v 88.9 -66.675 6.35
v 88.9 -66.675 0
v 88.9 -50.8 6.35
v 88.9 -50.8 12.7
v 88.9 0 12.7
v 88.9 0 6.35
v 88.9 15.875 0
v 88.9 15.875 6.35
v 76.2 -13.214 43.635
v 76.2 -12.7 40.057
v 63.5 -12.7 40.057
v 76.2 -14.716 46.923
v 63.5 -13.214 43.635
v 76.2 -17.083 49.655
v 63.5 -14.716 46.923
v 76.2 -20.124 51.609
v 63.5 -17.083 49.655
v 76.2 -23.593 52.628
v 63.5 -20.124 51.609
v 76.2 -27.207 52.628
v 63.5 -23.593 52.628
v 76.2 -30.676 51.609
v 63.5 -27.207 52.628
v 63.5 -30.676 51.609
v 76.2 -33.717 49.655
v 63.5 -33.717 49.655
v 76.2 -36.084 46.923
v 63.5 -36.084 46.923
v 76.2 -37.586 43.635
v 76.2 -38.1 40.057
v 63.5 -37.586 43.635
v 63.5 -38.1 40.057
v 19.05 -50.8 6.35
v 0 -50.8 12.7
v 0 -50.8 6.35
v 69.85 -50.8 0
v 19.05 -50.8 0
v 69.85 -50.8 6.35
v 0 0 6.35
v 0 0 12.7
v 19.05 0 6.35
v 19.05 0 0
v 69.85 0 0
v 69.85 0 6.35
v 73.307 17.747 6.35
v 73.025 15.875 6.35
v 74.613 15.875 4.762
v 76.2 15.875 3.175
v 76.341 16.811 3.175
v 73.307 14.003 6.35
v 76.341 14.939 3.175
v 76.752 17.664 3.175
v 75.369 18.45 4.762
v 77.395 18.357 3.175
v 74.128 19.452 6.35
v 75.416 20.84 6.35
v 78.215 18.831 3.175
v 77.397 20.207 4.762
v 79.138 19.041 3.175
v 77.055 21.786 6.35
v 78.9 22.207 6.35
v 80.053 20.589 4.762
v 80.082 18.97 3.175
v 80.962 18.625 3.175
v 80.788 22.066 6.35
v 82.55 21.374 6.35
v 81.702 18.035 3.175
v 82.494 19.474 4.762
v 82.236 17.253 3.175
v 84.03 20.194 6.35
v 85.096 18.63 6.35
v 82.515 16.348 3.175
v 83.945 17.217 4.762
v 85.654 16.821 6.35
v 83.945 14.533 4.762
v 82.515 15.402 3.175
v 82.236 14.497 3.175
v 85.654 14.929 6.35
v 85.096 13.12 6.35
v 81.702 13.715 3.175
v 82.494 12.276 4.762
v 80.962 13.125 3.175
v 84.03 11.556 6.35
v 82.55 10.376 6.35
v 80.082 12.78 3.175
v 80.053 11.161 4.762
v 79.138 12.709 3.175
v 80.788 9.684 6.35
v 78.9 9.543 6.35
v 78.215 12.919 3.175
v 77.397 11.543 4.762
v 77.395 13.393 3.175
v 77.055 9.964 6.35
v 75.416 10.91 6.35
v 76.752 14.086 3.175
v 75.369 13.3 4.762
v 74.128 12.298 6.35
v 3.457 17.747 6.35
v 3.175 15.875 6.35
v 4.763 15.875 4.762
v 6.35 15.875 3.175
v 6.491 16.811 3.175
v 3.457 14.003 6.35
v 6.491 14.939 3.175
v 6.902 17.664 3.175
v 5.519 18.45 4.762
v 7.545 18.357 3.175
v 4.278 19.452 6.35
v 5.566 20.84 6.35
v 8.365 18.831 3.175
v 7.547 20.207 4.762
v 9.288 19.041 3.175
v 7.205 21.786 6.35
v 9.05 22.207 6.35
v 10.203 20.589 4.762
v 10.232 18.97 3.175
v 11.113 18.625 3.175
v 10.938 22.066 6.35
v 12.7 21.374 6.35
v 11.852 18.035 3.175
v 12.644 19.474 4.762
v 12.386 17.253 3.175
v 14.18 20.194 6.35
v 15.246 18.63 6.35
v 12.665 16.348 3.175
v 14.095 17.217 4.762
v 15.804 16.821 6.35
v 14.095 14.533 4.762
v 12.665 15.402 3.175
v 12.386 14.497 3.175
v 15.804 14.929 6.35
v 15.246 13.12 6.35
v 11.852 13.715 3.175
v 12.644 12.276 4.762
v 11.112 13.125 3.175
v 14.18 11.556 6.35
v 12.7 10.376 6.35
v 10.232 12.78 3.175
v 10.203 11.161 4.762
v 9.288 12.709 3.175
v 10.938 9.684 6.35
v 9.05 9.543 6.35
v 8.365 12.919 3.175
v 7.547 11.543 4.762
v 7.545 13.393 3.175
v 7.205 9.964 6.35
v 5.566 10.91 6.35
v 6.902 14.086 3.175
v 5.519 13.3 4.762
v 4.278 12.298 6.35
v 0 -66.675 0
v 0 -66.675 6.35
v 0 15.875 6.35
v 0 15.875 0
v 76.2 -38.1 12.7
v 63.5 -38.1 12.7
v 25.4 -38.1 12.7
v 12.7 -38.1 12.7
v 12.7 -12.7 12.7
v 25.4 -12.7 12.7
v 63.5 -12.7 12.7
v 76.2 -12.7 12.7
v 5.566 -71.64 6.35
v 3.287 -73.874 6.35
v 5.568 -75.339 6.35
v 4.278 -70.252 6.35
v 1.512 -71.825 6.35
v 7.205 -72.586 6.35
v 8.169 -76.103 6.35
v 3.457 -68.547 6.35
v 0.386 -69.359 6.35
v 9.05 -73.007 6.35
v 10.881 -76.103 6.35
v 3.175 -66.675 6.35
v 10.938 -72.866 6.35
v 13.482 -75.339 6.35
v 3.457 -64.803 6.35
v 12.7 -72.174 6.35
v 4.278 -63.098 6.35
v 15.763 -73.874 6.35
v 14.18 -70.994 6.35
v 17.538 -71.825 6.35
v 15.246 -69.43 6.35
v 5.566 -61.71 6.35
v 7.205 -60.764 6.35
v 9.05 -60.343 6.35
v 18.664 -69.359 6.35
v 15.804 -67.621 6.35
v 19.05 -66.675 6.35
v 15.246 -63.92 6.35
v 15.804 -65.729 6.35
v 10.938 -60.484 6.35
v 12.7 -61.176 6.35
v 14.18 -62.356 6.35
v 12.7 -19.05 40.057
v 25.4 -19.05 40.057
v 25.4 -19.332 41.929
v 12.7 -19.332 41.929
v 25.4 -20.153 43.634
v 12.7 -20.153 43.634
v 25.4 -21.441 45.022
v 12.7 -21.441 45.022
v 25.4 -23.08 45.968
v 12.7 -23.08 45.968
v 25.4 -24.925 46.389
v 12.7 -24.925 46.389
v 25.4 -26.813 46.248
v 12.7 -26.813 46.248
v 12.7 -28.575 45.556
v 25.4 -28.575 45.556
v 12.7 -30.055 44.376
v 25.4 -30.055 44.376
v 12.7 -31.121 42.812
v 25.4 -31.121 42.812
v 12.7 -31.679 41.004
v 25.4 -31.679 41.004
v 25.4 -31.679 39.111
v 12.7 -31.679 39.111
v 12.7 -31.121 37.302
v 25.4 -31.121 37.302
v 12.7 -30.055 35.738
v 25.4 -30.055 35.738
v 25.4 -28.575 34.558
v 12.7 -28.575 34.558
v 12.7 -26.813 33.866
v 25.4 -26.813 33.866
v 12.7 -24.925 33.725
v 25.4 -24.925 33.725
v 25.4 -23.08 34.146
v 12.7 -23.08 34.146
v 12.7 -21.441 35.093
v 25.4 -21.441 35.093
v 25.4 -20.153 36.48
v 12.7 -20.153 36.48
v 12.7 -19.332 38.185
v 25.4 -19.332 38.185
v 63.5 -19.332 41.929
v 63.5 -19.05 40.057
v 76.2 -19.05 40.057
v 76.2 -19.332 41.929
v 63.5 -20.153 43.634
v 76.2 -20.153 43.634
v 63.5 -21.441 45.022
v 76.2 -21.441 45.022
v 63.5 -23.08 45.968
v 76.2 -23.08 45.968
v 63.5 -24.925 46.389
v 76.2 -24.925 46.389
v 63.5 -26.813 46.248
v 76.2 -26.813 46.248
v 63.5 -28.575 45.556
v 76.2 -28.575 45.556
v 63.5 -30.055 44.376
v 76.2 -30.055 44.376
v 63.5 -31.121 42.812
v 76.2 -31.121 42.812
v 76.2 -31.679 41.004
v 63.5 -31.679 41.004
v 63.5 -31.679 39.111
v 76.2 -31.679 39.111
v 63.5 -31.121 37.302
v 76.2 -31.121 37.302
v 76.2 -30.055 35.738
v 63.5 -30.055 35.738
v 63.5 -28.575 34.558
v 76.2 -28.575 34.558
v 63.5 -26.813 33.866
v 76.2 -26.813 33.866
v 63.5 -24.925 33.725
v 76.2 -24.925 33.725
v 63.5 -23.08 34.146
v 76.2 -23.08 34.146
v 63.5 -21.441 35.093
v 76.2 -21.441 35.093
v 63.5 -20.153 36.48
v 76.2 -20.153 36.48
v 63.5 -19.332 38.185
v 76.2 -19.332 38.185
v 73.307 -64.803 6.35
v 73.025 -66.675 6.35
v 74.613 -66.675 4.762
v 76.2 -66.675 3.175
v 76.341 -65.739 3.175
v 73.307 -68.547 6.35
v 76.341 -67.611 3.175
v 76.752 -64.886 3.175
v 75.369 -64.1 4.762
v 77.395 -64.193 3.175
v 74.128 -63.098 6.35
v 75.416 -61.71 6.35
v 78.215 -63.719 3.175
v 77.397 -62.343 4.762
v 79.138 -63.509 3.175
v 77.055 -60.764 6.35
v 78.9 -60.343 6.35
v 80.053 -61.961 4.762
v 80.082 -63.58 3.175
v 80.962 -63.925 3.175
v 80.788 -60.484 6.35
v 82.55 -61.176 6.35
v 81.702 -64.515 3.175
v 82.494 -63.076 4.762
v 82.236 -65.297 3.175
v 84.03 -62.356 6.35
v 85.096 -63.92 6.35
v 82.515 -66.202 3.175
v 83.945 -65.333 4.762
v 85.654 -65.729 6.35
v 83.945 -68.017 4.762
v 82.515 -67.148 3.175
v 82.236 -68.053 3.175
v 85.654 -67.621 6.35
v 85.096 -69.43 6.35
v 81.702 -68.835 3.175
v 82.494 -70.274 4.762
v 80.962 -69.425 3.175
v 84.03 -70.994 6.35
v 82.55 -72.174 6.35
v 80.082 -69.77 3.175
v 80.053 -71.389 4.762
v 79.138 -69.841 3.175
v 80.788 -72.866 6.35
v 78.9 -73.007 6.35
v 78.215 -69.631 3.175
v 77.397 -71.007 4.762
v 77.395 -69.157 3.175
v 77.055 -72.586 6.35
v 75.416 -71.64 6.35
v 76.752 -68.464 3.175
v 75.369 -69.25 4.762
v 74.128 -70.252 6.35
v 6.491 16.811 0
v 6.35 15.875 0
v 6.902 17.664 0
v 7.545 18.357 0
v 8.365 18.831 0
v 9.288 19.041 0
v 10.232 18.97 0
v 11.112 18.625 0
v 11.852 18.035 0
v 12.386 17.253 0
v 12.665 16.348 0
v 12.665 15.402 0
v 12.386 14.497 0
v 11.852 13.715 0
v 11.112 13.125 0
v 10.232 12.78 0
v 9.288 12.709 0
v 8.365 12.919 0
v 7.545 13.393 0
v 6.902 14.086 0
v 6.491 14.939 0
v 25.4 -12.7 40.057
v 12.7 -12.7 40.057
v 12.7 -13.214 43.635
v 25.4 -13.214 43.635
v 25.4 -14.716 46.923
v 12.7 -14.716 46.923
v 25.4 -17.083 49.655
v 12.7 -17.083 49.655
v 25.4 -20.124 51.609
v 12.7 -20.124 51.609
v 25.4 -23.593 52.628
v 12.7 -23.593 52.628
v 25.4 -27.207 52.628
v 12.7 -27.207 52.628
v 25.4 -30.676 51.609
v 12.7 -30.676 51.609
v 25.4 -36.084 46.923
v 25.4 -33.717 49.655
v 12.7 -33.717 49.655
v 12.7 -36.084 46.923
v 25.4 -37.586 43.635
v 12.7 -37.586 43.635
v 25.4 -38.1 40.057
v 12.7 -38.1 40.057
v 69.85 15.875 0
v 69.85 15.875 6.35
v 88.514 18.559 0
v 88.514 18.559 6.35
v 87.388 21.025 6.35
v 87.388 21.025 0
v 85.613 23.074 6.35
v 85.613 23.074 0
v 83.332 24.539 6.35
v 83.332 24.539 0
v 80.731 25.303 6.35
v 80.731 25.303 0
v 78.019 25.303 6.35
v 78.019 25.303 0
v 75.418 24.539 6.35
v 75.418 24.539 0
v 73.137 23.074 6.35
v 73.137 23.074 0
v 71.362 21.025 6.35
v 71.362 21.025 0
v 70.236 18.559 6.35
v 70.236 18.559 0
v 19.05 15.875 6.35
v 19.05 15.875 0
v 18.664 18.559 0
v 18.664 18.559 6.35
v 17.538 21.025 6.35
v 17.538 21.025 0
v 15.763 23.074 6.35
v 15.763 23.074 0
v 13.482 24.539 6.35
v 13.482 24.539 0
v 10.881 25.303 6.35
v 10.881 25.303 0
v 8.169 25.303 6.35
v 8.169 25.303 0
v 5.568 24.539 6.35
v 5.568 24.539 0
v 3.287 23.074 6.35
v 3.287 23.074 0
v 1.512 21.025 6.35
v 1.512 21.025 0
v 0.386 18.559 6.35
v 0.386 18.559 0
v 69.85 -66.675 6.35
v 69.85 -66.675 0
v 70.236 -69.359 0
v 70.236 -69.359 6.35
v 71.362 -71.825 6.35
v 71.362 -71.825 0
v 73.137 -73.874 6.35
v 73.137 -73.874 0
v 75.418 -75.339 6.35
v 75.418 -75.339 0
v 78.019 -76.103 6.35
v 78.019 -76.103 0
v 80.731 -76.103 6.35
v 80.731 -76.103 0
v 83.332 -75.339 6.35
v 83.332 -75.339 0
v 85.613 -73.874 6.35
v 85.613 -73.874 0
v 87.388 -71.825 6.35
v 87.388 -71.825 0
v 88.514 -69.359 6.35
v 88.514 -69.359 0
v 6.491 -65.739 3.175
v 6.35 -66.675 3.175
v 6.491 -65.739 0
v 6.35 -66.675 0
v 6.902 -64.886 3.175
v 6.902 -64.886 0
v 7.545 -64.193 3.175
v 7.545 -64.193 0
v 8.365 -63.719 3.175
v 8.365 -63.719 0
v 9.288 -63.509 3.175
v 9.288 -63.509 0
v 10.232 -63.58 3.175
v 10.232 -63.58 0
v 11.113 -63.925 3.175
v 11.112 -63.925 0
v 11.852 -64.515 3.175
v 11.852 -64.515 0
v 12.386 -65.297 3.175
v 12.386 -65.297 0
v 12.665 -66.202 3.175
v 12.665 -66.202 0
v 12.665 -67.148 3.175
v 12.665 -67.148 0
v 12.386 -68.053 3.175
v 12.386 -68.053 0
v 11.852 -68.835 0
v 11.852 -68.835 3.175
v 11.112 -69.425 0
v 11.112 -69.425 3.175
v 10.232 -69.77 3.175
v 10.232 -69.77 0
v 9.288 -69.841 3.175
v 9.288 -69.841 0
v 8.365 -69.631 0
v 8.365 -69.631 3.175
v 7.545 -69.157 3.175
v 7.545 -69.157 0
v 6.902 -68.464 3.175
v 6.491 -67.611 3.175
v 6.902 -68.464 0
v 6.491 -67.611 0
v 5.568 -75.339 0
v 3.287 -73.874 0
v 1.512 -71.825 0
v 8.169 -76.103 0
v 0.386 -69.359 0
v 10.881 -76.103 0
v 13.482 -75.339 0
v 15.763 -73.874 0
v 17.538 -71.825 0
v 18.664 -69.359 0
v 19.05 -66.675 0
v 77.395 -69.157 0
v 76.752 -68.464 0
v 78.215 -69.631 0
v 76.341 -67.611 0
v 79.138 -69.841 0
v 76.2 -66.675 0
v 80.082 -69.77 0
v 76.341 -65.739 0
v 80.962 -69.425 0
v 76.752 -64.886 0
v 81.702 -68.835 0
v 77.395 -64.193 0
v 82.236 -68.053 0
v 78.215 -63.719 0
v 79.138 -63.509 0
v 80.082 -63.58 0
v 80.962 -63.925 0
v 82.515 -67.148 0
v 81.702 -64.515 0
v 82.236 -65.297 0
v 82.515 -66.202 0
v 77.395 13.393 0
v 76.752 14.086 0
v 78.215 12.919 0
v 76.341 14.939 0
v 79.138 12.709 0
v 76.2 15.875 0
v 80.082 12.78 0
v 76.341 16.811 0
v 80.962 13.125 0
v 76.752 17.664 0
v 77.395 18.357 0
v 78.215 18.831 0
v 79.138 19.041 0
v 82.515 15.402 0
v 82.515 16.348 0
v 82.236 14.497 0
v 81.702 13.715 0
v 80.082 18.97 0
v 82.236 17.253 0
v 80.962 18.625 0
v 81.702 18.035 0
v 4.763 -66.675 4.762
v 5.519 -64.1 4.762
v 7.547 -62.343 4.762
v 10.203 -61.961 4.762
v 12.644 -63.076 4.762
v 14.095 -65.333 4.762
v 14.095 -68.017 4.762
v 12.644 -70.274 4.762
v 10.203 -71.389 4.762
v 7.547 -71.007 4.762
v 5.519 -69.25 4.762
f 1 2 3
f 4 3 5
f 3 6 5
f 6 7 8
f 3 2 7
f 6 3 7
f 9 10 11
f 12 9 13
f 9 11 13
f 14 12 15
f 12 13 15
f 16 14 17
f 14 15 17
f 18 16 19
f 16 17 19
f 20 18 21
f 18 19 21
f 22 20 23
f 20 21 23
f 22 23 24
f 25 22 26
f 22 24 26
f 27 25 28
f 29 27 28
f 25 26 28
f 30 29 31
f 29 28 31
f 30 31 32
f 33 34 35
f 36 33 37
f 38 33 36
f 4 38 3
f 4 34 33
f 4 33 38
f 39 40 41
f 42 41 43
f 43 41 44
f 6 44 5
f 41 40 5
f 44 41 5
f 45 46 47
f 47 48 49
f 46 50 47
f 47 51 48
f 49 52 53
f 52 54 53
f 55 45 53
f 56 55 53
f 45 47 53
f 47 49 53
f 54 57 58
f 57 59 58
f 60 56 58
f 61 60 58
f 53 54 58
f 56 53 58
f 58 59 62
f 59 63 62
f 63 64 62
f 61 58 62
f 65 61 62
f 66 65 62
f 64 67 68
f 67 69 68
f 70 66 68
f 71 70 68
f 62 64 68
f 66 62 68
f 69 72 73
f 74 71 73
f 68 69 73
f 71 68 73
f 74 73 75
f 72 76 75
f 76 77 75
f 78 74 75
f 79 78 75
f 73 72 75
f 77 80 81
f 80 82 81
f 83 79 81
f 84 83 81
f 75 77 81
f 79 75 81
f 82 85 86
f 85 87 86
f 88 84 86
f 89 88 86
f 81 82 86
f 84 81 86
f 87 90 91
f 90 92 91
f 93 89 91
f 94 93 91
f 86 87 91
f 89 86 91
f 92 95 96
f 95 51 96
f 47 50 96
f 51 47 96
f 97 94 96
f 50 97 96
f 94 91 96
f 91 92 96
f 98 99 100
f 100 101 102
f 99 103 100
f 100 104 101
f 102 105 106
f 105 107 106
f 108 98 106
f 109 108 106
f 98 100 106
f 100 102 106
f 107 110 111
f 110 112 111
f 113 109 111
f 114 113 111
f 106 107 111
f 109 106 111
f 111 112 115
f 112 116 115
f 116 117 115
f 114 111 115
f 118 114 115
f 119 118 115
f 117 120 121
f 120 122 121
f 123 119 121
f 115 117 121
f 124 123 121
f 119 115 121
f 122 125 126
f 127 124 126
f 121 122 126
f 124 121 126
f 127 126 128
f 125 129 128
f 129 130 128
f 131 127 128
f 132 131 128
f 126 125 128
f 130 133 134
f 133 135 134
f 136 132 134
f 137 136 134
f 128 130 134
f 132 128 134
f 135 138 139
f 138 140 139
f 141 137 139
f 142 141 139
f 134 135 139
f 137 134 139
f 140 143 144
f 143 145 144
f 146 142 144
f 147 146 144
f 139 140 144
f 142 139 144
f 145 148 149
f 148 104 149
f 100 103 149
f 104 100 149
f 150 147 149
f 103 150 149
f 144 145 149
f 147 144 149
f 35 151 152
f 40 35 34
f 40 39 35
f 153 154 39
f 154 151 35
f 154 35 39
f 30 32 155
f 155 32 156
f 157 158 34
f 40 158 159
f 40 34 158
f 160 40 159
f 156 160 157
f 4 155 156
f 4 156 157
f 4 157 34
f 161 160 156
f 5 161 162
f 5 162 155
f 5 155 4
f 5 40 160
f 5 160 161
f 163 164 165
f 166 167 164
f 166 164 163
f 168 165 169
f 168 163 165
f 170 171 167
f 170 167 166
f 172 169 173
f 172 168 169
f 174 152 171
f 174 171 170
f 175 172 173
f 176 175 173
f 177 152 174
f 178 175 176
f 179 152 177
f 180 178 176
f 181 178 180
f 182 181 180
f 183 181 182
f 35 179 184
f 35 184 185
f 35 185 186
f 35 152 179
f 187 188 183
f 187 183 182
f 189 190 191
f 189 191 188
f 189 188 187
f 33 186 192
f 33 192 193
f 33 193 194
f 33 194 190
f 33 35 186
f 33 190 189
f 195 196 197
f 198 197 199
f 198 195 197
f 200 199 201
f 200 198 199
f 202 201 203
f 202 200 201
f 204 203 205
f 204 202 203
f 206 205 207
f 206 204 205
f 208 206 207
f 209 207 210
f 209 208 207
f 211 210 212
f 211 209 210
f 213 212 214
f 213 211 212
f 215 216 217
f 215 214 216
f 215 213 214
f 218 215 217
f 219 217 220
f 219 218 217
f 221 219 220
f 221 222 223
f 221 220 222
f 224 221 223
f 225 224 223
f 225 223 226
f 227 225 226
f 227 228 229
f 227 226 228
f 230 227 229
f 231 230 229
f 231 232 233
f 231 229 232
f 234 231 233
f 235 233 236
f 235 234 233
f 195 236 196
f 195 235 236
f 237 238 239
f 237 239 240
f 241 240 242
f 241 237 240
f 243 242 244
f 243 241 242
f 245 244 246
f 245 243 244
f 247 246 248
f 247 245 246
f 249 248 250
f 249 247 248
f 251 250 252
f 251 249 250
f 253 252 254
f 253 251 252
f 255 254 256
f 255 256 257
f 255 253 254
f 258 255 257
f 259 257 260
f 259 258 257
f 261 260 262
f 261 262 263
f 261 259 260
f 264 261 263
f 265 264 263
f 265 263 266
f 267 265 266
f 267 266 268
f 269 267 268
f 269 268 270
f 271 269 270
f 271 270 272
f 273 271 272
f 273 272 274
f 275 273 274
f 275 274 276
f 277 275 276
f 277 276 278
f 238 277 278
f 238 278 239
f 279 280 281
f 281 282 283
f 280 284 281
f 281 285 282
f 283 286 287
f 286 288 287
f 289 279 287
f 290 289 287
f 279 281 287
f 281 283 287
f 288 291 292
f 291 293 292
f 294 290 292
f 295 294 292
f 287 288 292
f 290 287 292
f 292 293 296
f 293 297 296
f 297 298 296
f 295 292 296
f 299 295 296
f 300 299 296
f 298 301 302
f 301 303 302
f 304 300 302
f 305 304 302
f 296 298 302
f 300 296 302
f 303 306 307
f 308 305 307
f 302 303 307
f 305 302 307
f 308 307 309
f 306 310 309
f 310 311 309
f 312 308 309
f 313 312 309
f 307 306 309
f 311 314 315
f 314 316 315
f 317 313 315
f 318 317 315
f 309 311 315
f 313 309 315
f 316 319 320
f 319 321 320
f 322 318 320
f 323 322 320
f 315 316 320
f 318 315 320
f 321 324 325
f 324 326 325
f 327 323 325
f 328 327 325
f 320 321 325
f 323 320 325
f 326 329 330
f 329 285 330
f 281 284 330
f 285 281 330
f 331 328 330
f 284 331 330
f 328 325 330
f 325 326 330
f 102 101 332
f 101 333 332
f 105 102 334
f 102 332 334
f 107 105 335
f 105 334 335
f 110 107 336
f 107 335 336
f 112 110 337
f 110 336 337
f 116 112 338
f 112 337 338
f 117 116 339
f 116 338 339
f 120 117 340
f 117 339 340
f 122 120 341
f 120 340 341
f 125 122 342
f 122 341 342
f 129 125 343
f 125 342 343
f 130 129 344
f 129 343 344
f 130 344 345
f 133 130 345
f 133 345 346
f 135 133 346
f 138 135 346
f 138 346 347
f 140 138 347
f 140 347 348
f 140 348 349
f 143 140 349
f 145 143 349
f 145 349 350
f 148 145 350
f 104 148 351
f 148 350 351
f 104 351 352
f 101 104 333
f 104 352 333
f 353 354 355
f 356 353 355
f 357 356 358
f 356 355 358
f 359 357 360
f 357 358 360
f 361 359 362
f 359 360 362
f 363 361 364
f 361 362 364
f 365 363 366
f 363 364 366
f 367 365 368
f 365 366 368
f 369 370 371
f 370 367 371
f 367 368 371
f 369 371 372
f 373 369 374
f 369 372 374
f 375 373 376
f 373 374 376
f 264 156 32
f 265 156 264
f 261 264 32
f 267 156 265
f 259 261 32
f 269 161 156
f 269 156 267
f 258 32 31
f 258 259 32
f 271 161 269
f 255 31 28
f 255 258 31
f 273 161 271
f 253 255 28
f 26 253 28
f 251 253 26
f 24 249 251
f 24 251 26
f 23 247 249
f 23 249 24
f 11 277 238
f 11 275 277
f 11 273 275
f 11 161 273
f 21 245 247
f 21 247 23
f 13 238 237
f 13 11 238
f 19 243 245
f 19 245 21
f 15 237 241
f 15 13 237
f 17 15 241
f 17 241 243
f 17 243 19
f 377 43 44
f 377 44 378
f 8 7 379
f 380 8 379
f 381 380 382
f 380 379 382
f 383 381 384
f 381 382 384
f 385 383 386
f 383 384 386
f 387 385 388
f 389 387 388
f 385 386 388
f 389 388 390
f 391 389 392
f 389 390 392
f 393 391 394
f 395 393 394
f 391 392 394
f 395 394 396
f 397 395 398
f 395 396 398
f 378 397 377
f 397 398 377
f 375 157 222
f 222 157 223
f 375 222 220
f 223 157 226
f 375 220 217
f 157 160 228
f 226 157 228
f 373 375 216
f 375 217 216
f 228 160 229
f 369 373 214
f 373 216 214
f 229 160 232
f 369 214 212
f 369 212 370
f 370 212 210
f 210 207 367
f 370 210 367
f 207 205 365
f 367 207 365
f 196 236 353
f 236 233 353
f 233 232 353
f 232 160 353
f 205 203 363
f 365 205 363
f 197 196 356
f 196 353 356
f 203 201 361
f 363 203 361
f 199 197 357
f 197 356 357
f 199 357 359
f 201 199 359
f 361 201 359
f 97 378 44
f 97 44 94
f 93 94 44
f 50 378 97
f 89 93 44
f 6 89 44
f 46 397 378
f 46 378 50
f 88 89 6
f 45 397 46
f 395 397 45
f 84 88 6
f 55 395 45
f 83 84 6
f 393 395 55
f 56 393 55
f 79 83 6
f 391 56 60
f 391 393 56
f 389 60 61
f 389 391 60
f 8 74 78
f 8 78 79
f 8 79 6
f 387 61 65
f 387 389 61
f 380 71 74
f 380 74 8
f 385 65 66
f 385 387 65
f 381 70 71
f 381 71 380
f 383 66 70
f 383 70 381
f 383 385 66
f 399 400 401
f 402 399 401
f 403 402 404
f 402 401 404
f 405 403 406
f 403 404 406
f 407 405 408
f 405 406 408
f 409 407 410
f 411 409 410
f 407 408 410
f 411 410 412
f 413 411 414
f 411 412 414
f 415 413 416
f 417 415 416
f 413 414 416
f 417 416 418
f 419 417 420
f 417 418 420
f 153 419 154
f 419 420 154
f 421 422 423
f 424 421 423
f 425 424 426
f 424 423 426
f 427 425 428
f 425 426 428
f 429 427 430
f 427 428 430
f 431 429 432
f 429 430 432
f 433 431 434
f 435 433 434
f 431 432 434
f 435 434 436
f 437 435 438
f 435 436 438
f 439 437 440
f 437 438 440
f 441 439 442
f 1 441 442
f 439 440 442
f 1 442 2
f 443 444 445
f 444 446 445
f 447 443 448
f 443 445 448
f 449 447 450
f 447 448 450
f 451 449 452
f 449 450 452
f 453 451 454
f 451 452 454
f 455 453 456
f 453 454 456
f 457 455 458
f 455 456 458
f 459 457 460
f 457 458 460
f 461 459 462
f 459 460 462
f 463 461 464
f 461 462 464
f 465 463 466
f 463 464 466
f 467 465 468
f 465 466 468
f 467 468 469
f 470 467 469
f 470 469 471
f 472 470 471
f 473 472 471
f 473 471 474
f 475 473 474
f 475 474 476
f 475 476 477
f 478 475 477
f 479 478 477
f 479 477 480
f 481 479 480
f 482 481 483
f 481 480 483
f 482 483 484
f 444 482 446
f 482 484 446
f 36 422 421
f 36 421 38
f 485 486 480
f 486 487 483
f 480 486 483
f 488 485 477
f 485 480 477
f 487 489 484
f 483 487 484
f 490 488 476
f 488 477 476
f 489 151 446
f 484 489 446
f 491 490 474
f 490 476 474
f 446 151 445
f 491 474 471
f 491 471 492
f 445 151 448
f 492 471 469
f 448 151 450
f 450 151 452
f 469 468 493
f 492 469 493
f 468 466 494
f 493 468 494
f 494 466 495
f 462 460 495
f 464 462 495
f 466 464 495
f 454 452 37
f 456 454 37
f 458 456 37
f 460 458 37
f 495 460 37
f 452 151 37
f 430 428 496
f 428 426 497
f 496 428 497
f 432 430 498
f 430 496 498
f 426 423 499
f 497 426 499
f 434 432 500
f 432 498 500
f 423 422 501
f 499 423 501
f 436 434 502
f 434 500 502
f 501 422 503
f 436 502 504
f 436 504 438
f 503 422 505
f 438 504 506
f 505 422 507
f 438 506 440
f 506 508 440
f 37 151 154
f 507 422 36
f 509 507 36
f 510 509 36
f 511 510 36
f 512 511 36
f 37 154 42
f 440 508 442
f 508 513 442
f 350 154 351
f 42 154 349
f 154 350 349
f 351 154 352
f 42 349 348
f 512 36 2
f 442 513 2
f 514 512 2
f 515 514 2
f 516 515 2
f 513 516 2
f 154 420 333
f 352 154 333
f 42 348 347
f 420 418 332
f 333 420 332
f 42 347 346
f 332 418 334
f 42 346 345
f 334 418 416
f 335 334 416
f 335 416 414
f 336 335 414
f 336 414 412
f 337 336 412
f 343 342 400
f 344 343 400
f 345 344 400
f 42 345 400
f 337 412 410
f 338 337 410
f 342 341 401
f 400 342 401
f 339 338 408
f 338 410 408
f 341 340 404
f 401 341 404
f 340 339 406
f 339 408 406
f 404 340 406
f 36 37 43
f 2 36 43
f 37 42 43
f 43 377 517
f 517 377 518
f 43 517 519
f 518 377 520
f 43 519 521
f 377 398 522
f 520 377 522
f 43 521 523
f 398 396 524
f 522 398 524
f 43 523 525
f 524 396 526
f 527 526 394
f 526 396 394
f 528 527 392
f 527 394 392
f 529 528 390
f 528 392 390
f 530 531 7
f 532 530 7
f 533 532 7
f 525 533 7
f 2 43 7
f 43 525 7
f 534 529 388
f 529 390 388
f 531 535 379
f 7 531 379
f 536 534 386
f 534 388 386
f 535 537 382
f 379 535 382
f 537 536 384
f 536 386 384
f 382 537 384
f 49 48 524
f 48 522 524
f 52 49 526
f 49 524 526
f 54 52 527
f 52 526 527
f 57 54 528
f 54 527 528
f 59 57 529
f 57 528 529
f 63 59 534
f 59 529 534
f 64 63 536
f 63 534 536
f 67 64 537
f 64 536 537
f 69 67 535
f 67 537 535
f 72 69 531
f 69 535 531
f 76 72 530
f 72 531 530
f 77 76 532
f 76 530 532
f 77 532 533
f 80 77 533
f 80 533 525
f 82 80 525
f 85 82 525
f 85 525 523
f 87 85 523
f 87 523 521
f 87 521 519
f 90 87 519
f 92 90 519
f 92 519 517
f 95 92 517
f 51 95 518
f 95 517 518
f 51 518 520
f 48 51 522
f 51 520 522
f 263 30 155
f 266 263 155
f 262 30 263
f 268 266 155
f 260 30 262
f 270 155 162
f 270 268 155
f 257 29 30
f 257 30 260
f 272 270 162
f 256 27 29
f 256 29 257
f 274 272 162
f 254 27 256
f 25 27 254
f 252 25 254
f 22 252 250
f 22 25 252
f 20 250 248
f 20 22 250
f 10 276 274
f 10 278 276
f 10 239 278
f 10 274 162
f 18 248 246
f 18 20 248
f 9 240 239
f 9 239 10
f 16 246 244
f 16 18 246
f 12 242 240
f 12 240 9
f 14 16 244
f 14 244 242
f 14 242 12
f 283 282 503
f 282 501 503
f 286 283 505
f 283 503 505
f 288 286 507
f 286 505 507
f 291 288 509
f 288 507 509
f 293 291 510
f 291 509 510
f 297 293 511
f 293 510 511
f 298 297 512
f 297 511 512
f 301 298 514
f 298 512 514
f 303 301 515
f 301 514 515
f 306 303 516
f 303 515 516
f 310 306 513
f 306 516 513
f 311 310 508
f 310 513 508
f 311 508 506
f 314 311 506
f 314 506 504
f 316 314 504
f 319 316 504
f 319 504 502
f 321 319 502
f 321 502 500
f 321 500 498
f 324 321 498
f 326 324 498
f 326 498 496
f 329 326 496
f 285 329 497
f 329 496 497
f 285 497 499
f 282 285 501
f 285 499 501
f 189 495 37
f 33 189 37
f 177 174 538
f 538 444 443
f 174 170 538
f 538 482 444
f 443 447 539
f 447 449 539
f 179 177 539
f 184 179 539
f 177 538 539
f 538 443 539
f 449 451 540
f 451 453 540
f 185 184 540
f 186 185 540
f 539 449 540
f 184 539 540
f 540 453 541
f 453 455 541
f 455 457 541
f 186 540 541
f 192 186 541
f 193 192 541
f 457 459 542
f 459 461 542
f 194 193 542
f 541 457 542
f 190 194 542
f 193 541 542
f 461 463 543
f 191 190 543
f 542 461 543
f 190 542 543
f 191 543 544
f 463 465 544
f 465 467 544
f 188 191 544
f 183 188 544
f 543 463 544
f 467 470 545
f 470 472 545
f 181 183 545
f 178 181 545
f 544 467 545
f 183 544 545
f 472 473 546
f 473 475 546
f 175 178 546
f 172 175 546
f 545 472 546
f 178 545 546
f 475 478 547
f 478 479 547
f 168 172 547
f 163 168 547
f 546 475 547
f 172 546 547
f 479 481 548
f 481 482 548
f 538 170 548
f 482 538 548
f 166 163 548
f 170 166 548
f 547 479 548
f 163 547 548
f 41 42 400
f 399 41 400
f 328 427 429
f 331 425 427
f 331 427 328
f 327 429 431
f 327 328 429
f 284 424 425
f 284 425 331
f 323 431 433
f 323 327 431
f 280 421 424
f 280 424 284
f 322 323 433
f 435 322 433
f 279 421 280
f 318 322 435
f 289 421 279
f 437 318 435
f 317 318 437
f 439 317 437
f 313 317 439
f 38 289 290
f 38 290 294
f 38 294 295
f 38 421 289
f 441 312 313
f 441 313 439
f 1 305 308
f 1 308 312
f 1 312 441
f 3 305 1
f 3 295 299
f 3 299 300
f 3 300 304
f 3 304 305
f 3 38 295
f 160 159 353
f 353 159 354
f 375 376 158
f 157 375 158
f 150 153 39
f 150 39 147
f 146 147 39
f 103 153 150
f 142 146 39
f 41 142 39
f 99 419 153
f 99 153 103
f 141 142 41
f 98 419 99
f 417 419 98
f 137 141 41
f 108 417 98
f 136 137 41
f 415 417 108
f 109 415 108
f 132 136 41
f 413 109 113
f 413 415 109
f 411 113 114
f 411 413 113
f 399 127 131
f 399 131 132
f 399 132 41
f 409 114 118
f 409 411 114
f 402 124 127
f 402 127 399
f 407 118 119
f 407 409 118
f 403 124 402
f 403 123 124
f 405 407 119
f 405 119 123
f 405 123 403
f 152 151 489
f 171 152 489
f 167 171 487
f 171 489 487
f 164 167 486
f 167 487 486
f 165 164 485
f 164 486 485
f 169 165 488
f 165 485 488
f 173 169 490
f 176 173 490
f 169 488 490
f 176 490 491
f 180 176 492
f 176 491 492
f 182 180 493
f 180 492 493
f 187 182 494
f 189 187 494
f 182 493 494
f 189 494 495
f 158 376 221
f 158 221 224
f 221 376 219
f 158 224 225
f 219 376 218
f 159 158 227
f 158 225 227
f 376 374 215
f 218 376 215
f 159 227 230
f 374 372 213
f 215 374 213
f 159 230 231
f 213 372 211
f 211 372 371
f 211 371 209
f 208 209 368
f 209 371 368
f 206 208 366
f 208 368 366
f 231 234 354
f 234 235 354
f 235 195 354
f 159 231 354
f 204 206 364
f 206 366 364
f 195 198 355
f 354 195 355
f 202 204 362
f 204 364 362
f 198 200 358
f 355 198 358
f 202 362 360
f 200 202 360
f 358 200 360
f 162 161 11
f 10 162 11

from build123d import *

# Parameters (mm, degrees)
F0_W           = 88.9
F0_H           = 12.7
F1_DEPTH       = 50.8
F2_W           = 19.05
F2_H           = 15.875
F3_DEPTH       = 6.35
F5_START       = 12.7
F4_R           = 6.35
F5_DEPTH       = 63.5
F6_W           = 38.1
F6_H           = 44.45
F7_DEPTH       = 50.8
F9_D           = 6.35
F9_CSINK_D     = 12.7
F9_CSINK_ANGLE = 90


with BuildPart() as f1:
    # F0 (on Front) → F1 (new body)
    with BuildSketch(Plane.XZ):
        with Locations((44.45, 6.35)):
            Rectangle(F0_W, F0_H)
    extrude(amount=F1_DEPTH)

    # F2 (on Top) → F3 (join)
    with BuildSketch(Plane.XY):
        with Locations((79.375, 7.9375)):
            Rectangle(F2_W, F2_H)
        with Locations((79.375, -58.7375)):
            Rectangle(F2_W, F2_H)
        with Locations((9.525, -58.7375)):
            Rectangle(F2_W, F2_H)
        with Locations((9.525, 7.9375)):
            Rectangle(F2_W, F2_H)
        with BuildLine():
            ThreePointArc((19.05, 15.875), (9.525, 25.4), (0, 15.875))
            Line((0, 15.875), (19.05, 15.875))
        make_face()
        with BuildLine():
            Line((19.05, -66.675), (0, -66.675))
            ThreePointArc((0, -66.675), (9.525, -76.2), (19.05, -66.675))
        make_face()
        with BuildLine():
            ThreePointArc((88.9, 15.875), (79.375, 25.4), (69.85, 15.875))
            Line((69.85, 15.875), (88.9, 15.875))
        make_face()
        with BuildLine():
            Line((88.9, -66.675), (69.85, -66.675))
            ThreePointArc((69.85, -66.675), (79.375, -76.2), (88.9, -66.675))
        make_face()
    extrude(amount=F3_DEPTH)

    # F4 (on Right) → F5 (join)
    with BuildSketch(Plane.YZ.offset(F5_START)):
        Polygon((-50.8, 0), (0, 0), (0, 12.5690720878), (-12.7, 12.5690720878), (-38.1, 12.5690720878), (-50.8, 12.5690720878), align=None)
        with BuildLine():
            Line((-38.1, 12.5690720878), (-12.7, 12.5690720878))
            Line((-12.7, 12.5690720878), (-12.7, 40.0571599603))
            ThreePointArc((-12.7, 40.0571599603), (-25.4, 52.7571599603), (-38.1, 40.0571599603))
            Line((-38.1, 40.0571599603), (-38.1, 12.5690720878))
        make_face()
        with Locations((-25.4, 40.0571599603)):
            Circle(F4_R, mode=Mode.SUBTRACT)
    extrude(amount=F5_DEPTH)

    # F6 (on Front) → F7 (cut)
    with BuildSketch(Plane.XZ):
        with Locations((44.45, 34.925)):
            Rectangle(F6_W, F6_H)
    extrude(amount=F7_DEPTH, mode=Mode.SUBTRACT)

    # F9 (through all)
    with Locations(Plane.XY.offset(6.35)):
        with Locations((9.525, -66.675), (79.375, -66.675), (9.525, 15.875), (79.375, 15.875)):
            CounterSinkHole(F9_D / 2, F9_CSINK_D / 2, counter_sink_angle=F9_CSINK_ANGLE)


solid = f1.part
